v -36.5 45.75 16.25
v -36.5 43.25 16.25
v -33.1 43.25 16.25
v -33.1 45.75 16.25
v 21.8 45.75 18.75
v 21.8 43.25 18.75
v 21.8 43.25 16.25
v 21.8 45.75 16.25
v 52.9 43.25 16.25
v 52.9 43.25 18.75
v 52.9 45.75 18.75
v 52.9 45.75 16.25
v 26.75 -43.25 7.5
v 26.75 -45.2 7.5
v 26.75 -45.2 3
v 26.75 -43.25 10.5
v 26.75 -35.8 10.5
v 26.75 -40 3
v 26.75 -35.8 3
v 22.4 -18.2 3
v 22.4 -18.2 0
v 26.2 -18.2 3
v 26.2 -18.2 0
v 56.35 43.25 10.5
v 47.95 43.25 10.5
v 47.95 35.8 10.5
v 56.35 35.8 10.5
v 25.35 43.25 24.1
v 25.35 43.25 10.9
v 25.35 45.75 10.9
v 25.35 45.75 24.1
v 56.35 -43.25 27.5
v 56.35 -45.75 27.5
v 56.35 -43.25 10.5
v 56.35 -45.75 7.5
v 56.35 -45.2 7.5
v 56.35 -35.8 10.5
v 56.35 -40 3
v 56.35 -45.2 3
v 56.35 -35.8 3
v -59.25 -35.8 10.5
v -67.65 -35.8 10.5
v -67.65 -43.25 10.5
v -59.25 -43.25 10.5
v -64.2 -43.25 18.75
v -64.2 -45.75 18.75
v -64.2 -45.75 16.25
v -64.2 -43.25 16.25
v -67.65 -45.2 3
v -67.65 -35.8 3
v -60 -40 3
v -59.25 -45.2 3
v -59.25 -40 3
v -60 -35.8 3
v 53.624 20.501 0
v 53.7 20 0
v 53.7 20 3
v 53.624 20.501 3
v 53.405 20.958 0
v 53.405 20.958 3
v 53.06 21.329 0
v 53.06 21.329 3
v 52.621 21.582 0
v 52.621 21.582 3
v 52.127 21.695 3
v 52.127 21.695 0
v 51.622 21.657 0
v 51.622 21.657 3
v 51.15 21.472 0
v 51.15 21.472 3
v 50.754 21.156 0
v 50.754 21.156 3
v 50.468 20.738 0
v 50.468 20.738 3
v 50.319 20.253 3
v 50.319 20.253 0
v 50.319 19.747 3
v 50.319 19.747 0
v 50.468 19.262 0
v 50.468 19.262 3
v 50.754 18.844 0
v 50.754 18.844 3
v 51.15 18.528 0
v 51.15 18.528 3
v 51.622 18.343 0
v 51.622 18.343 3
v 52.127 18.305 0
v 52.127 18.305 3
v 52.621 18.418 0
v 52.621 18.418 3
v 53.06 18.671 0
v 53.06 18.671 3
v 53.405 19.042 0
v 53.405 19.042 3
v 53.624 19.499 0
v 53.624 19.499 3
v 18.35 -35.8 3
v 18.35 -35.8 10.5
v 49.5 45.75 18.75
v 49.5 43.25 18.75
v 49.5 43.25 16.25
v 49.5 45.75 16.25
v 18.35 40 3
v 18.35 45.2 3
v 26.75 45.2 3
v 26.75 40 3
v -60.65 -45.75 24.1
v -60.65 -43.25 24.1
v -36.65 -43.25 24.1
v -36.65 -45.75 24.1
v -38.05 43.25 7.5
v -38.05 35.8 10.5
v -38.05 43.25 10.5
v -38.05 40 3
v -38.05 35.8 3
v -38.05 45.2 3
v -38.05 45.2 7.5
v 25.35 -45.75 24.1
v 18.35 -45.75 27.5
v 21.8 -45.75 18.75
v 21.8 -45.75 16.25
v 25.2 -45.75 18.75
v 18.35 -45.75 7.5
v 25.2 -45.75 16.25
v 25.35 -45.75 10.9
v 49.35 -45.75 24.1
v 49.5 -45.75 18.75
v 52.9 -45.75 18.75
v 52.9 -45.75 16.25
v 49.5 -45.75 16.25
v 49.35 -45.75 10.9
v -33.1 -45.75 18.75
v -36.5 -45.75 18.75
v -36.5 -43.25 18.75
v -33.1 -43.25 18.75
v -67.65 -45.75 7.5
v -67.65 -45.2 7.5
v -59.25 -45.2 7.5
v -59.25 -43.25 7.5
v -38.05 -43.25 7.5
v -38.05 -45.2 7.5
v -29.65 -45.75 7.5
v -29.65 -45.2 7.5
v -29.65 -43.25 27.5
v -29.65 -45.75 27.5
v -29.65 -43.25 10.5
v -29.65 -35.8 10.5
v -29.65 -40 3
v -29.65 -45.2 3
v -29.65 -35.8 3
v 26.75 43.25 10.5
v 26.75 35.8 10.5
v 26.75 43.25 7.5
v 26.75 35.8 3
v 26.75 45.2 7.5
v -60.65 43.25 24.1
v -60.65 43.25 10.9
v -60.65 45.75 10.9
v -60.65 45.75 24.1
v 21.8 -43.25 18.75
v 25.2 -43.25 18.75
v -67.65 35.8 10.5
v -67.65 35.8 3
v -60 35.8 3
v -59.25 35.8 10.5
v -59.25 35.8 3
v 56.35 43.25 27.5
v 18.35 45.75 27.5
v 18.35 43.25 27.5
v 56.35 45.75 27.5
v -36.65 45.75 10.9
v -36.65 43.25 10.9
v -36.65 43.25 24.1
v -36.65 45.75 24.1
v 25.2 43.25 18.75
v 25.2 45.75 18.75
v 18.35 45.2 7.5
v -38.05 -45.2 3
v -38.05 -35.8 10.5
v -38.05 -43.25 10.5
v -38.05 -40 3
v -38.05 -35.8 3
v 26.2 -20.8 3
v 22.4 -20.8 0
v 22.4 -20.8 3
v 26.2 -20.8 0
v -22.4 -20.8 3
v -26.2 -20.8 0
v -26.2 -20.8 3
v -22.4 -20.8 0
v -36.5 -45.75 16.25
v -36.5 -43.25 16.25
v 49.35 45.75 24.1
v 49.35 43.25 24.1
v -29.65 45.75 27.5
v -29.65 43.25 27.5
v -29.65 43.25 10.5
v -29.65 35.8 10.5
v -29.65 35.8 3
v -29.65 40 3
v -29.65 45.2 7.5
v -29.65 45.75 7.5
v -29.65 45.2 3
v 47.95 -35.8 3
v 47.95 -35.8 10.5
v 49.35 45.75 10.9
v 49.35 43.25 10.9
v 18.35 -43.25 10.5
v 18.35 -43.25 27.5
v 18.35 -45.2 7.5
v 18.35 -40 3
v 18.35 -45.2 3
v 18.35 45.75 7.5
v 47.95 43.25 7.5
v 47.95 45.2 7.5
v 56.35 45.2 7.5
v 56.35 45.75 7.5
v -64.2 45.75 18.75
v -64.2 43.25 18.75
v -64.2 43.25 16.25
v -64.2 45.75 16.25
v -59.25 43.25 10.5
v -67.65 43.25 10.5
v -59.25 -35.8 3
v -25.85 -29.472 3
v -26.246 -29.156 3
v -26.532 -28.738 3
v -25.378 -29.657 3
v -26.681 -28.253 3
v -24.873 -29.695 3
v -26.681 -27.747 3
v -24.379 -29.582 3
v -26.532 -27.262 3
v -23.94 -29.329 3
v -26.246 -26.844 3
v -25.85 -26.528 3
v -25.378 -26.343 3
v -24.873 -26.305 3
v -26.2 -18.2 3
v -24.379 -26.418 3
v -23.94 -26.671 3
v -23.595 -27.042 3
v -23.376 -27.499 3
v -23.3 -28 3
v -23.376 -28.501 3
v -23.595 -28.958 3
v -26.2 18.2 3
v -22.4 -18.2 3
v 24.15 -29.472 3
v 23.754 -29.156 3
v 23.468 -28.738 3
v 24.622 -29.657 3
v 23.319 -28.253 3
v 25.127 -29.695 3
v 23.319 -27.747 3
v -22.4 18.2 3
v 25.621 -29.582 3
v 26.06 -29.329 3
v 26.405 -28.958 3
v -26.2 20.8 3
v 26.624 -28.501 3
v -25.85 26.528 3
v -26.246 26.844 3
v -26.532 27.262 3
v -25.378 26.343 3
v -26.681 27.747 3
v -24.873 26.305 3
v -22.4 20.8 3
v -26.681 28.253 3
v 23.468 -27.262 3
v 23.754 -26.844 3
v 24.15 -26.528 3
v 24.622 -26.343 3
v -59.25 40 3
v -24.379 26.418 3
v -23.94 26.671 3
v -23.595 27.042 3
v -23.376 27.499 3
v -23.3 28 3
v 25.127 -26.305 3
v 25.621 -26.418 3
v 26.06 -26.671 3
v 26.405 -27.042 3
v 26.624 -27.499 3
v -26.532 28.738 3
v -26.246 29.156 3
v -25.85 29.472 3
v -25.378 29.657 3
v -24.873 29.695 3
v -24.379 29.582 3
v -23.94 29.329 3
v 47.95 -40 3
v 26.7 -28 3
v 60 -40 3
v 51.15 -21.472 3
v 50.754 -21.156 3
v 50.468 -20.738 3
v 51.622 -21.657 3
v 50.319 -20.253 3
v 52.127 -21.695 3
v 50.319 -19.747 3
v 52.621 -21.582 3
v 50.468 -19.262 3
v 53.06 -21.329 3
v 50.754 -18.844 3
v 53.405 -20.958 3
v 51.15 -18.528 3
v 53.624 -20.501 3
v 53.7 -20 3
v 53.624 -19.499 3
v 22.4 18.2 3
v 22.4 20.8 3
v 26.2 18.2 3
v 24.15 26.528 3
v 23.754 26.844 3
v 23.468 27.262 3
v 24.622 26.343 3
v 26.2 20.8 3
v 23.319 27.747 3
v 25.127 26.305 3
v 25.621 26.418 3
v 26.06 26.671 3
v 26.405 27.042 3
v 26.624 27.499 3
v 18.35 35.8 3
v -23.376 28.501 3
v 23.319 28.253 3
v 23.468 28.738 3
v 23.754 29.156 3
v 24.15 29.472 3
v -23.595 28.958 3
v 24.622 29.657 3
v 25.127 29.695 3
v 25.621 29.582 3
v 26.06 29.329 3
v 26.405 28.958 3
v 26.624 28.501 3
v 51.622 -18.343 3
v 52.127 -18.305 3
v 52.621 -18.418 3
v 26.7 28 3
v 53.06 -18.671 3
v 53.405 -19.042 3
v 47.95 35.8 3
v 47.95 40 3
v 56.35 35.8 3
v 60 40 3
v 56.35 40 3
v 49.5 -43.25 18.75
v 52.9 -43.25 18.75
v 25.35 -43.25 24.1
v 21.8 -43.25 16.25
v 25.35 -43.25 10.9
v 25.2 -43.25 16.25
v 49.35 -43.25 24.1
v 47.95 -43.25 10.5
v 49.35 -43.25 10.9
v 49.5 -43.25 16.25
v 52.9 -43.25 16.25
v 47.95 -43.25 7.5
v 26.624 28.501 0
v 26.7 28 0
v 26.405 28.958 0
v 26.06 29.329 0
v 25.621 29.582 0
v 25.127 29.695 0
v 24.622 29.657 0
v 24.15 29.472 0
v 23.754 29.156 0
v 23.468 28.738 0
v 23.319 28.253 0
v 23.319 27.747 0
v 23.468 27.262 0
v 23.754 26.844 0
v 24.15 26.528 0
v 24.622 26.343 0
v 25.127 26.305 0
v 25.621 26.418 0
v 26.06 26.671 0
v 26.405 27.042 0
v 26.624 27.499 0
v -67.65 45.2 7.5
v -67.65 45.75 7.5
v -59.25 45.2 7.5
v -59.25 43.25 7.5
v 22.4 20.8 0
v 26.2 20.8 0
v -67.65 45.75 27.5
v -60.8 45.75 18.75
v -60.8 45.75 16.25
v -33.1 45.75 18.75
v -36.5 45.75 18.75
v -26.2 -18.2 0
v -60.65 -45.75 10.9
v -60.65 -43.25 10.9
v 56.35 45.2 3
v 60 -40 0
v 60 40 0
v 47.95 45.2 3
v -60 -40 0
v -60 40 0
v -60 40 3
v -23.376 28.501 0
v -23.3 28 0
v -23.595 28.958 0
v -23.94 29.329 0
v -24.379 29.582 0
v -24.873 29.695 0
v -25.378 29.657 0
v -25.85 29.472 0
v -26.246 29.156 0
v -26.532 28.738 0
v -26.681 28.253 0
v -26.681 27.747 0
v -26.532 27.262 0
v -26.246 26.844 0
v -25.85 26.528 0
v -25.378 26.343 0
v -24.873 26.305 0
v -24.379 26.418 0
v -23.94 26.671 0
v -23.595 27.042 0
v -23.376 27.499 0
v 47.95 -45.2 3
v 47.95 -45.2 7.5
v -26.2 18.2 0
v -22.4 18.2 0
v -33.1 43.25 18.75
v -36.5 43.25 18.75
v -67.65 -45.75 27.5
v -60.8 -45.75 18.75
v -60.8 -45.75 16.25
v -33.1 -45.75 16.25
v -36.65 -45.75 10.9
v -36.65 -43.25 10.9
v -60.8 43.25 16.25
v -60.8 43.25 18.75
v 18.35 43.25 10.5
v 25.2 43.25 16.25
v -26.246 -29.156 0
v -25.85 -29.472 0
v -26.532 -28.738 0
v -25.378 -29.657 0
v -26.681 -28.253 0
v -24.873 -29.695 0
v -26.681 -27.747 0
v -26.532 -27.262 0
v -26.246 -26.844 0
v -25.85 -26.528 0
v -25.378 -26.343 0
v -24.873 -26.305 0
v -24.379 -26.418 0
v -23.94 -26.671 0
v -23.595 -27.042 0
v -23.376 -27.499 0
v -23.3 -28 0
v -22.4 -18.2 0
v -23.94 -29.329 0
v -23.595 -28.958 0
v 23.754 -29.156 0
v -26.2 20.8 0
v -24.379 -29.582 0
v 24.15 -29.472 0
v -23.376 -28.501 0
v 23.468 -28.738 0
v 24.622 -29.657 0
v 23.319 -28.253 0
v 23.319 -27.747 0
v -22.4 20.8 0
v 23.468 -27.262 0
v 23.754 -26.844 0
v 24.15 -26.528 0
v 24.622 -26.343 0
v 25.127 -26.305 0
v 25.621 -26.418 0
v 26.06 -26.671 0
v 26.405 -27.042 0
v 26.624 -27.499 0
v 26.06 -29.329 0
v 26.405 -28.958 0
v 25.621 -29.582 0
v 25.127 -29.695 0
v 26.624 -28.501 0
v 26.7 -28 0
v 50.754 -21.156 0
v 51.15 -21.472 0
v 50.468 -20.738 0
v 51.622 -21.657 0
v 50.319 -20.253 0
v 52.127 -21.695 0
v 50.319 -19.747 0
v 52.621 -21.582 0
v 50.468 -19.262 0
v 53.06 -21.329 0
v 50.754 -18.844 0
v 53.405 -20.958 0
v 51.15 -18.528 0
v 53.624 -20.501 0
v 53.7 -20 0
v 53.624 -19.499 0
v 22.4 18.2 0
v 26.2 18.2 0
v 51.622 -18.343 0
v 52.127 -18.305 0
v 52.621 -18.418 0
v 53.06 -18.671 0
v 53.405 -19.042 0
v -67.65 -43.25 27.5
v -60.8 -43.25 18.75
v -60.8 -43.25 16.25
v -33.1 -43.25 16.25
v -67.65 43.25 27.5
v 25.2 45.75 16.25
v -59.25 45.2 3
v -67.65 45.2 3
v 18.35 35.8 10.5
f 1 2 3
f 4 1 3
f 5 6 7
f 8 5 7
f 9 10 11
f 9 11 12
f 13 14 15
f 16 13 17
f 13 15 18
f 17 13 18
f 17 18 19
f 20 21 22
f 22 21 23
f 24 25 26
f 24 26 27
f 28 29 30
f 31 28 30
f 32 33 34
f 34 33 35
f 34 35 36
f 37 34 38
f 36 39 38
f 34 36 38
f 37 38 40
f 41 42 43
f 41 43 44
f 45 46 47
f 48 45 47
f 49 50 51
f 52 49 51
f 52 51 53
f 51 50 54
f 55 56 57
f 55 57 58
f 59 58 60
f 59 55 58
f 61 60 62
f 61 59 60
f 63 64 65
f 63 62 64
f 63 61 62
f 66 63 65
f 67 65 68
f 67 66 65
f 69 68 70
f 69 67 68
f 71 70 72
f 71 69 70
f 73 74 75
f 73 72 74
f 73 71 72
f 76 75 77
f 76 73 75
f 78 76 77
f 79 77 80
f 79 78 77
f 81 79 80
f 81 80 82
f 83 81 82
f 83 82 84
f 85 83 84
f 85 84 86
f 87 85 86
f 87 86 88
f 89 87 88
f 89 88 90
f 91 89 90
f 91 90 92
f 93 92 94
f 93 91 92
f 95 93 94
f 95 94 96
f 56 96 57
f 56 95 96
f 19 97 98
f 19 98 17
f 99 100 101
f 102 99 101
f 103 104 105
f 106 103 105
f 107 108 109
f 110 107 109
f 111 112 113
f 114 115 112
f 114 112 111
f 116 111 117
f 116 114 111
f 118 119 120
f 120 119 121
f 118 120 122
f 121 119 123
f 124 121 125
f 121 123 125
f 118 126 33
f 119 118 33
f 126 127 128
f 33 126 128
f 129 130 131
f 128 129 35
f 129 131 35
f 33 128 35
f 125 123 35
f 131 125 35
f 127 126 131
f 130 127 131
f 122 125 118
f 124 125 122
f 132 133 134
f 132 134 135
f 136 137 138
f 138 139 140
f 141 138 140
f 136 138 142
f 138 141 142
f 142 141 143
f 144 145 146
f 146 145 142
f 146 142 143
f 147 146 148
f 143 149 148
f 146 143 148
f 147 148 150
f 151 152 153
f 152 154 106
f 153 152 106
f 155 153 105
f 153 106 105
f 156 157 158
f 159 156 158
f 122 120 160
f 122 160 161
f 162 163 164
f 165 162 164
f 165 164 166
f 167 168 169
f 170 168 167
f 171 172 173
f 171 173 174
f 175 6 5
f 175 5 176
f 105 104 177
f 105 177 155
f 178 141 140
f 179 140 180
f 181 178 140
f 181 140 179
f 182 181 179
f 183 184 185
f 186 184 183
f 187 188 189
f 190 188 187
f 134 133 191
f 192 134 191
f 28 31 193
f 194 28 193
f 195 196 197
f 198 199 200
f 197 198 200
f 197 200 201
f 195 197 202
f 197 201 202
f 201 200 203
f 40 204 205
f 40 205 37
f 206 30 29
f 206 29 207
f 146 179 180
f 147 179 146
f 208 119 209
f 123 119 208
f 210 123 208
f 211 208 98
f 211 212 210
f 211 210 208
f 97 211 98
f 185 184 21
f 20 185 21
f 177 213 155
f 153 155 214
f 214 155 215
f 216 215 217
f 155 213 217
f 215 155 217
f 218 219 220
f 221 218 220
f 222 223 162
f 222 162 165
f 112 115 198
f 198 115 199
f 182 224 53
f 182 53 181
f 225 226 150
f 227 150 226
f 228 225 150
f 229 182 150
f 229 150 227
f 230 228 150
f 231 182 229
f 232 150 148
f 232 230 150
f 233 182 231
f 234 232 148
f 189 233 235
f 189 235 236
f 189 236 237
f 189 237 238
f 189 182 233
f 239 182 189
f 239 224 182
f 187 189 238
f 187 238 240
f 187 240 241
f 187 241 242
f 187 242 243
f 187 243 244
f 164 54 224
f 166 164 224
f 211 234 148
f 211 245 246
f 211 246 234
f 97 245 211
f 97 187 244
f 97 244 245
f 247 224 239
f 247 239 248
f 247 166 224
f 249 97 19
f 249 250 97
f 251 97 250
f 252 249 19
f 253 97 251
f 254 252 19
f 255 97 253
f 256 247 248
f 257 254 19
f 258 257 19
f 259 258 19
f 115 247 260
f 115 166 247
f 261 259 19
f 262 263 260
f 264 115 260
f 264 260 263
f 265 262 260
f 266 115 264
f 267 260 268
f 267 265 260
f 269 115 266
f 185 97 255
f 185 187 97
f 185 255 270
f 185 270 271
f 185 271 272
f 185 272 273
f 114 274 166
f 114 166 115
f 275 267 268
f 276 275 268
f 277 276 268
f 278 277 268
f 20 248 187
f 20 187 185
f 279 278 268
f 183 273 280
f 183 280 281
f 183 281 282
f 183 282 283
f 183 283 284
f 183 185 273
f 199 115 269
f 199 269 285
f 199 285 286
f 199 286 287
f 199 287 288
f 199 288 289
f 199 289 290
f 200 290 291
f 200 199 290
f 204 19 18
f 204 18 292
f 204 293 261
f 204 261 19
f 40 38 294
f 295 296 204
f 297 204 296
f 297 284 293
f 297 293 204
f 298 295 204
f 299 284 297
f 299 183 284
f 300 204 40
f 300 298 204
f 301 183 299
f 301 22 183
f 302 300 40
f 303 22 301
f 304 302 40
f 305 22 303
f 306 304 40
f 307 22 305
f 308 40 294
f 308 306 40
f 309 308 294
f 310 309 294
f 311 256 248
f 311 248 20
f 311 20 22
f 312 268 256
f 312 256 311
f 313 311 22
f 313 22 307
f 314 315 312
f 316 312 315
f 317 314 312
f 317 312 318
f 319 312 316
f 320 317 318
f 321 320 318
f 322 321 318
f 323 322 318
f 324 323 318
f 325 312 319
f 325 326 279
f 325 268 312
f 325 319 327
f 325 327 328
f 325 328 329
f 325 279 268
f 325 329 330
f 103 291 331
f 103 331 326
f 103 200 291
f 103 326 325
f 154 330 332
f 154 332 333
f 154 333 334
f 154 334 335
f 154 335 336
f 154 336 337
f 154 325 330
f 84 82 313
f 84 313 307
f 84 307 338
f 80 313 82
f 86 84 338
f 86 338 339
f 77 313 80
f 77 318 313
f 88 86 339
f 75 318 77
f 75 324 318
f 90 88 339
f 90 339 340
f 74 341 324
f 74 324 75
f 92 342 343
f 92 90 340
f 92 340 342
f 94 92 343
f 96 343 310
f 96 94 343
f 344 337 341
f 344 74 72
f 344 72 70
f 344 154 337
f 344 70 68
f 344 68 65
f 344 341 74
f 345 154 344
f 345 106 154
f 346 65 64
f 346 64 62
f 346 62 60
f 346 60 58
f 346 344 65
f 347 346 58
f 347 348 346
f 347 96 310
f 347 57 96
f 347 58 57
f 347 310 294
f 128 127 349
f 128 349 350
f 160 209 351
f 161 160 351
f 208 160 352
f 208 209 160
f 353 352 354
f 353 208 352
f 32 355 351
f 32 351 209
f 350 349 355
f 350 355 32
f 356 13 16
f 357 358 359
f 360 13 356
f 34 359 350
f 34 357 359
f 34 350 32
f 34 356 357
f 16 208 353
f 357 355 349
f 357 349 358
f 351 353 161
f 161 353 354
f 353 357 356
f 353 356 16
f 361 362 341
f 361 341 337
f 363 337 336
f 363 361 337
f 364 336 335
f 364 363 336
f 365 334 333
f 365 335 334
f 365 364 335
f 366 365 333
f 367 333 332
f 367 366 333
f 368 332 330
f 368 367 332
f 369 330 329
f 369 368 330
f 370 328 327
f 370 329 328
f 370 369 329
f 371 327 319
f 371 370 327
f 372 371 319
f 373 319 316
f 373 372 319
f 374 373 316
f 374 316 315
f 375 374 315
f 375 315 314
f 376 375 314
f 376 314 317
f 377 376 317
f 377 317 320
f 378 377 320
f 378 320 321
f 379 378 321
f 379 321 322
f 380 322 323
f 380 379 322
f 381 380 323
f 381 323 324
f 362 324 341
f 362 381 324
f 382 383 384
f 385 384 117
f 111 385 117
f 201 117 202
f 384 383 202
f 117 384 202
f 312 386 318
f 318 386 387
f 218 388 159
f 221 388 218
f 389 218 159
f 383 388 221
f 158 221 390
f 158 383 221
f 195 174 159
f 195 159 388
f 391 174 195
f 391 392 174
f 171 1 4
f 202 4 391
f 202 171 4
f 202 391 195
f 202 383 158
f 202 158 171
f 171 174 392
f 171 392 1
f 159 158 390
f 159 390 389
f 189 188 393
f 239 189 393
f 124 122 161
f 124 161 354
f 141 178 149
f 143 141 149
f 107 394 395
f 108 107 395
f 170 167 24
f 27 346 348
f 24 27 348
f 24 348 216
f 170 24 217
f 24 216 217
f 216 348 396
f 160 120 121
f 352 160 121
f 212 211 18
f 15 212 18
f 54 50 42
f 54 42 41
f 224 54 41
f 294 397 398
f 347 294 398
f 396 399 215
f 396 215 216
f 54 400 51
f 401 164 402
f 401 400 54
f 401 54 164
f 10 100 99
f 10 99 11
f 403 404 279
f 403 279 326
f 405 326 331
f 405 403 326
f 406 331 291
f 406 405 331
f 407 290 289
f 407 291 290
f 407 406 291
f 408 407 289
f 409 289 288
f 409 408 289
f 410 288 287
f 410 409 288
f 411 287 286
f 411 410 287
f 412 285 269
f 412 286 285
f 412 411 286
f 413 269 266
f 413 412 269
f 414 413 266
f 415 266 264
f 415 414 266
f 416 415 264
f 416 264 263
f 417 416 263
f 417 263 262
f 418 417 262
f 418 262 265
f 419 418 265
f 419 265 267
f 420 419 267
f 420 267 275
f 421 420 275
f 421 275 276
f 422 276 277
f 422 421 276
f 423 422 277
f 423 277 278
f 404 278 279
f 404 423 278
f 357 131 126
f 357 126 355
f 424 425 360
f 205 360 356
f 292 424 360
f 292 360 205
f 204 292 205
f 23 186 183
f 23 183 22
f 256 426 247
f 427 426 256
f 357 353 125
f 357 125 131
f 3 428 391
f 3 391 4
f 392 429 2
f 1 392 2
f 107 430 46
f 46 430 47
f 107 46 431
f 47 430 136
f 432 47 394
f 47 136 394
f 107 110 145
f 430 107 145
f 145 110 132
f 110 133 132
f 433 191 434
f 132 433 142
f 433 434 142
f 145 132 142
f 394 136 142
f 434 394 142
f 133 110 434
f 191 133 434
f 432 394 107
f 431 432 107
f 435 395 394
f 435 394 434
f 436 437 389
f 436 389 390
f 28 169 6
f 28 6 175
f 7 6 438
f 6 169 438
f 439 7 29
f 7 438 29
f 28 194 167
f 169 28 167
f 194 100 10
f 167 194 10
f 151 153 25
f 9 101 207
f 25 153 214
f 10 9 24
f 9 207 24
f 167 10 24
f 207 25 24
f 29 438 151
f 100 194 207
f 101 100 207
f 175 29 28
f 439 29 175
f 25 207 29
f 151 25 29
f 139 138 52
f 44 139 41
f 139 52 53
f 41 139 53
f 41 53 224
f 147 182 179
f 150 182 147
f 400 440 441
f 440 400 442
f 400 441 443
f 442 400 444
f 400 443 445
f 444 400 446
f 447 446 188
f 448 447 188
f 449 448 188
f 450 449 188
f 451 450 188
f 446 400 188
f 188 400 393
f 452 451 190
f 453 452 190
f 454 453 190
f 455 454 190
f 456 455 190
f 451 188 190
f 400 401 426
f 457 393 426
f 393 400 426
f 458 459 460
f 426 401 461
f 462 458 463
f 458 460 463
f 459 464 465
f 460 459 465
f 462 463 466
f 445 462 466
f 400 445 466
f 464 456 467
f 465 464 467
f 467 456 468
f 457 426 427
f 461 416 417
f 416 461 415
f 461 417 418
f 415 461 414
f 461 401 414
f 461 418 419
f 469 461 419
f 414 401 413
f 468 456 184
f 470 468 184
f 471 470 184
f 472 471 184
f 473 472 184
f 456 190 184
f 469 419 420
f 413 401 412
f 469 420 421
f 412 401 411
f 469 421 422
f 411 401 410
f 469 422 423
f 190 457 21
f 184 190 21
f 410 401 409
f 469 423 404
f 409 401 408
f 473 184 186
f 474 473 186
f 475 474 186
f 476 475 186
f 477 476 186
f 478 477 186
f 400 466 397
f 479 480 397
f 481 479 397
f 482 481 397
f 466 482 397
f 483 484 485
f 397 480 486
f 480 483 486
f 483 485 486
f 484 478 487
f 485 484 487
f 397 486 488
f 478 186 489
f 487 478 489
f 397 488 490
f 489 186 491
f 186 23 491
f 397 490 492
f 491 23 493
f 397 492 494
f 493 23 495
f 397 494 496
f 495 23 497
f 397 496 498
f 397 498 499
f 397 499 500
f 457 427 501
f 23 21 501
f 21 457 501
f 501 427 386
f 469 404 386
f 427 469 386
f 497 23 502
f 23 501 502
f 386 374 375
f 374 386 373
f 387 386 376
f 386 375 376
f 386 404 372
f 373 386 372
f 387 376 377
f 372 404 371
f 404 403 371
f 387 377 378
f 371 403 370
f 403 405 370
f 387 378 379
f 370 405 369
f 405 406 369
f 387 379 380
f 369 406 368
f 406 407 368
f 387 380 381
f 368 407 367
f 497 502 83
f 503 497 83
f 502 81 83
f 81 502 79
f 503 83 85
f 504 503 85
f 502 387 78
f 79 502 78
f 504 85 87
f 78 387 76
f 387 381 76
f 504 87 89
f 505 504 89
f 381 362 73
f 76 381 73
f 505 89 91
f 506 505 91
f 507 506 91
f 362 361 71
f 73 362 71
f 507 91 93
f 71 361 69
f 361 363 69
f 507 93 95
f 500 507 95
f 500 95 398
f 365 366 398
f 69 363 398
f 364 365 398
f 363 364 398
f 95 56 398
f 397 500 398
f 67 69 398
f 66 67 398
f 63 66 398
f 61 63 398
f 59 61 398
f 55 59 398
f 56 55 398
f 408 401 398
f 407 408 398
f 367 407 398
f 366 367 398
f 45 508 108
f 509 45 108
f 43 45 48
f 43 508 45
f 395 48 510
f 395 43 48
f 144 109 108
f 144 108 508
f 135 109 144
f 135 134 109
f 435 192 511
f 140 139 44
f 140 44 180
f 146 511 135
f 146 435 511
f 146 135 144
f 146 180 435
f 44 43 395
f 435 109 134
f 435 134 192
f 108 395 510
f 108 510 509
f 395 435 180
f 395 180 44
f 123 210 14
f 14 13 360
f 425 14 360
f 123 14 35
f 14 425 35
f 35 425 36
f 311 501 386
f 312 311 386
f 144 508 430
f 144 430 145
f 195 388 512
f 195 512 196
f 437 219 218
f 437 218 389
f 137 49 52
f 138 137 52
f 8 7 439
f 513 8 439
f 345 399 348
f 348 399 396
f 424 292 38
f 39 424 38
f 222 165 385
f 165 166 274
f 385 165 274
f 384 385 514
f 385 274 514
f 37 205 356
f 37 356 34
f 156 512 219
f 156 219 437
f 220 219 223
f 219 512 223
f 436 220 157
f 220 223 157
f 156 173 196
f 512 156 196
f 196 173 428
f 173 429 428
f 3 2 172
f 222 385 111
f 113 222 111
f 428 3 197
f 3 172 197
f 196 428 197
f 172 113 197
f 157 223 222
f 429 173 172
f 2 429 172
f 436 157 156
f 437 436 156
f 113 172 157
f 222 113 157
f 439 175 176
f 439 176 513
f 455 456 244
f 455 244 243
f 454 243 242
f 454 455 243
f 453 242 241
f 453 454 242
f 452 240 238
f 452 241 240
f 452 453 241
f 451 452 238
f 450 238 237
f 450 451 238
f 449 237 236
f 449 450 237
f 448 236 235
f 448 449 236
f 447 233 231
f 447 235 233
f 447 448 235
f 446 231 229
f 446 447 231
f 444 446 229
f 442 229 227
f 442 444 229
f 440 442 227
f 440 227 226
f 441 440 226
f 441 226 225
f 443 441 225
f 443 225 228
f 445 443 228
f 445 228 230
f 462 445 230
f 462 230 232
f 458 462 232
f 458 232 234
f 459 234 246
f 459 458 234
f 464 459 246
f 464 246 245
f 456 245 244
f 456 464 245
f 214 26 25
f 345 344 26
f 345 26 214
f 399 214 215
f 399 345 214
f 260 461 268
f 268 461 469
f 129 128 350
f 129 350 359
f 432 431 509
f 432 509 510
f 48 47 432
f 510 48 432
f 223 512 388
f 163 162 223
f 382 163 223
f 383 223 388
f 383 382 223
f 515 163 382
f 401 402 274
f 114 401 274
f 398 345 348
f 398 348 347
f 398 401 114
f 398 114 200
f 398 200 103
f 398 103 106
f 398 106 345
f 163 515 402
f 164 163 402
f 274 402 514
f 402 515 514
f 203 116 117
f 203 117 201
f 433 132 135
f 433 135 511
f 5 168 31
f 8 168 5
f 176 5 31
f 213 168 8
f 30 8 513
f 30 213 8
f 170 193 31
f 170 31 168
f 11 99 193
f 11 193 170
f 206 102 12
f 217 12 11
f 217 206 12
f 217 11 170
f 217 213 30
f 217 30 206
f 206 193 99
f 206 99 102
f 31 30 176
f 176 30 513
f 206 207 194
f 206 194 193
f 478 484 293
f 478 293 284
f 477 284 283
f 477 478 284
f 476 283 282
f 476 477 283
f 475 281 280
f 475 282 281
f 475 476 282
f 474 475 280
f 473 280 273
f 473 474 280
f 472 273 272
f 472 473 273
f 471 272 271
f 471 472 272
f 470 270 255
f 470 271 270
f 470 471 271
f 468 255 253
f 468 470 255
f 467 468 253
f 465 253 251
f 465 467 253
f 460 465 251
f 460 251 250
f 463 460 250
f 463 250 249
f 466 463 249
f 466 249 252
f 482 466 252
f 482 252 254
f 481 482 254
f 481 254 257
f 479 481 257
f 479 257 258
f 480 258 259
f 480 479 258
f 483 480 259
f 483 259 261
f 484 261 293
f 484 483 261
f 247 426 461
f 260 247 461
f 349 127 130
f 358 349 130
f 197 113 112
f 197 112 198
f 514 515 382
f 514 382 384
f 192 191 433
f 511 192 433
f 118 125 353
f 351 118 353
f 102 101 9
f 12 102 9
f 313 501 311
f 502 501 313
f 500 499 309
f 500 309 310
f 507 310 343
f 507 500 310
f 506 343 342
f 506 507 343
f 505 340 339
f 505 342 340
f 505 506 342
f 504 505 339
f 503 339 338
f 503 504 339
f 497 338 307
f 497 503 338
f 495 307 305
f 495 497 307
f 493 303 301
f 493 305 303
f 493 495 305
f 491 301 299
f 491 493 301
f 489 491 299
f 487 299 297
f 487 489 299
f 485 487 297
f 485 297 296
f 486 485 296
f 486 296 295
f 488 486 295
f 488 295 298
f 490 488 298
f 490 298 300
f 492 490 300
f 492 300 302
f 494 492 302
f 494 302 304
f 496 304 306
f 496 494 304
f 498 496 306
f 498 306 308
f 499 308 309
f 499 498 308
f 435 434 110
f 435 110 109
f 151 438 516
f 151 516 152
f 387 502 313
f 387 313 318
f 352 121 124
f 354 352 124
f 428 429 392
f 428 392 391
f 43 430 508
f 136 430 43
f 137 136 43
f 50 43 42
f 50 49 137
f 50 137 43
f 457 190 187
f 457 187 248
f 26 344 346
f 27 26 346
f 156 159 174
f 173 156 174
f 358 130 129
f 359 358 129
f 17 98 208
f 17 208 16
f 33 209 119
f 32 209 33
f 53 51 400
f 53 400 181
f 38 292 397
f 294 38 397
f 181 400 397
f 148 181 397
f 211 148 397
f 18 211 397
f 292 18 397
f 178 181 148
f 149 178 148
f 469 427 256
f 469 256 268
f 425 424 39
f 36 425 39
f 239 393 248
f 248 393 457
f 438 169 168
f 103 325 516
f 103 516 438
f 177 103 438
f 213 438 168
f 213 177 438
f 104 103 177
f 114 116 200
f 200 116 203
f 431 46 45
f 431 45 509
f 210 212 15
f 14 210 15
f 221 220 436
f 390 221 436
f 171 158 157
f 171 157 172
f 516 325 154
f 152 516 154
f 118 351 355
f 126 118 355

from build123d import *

# Parameters (mm, degrees)
SKETCH_1_W                       = 120
SKETCH_1_H                       = 80
DECK_120X80X3_DEPTH              = 3
FRAME_RIB_START                  = 3
SKETCH_2_W                       = 8.4
SKETCH_2_H                       = 9.4
FRAME_RIB_DEPTH                  = 7.5
EXTRUDE_START                    = 3
SKETCH_3_W                       = 8.4
SKETCH_3_H                       = 9.4
EXTRUDE_3_DEPTH                  = 7.5
MOUNT_UPRIGHT_START              = 10.5
SKETCH_4_W                       = 7
SKETCH_4_H                       = 2.5
MOUNT_UPRIGHT_DEPTH              = 17
EXTRUDE_START_2                  = 10.5
SKETCH_5_W                       = 7
SKETCH_5_H                       = 2.5
EXTRUDE_5_DEPTH                  = 17
MOUNT_LOWER_BEAM_START           = 7.5
SKETCH_6_W                       = 38
SKETCH_6_H                       = 2.5
MOUNT_LOWER_BEAM_DEPTH           = 3.4
MOUNT_UPPER_BEAM_START           = 24.1
SKETCH_7_W                       = 38
SKETCH_7_H                       = 2.5
MOUNT_UPPER_BEAM_DEPTH           = 3.4
SERVO_EAR_ADJUSTABLE_SLOTS_START = -46.5
SKETCH_8_W                       = 3.4
SKETCH_8_H                       = 2.5
SERVO_EAR_ADJUSTABLE_SLOTS_DEPTH = 4
SKETCH_9_W                       = 8.4
SKETCH_9_H                       = 9.4
EXTRUDE_8_DEPTH                  = 7.5
SKETCH_10_W                      = 8.4
SKETCH_10_H                      = 9.4
EXTRUDE_9_DEPTH                  = 7.5
SKETCH_11_W                      = 7
SKETCH_11_H                      = 2.5
EXTRUDE_10_DEPTH                 = 17
SKETCH_12_W                      = 7
SKETCH_12_H                      = 2.5
EXTRUDE_11_DEPTH                 = 17
EXTRUDE_START_3                  = 7.5
SKETCH_13_W                      = 38
SKETCH_13_H                      = 2.5
EXTRUDE_12_DEPTH                 = 3.4
EXTRUDE_START_4                  = 24.1
SKETCH_14_W                      = 38
SKETCH_14_H                      = 2.5
EXTRUDE_13_DEPTH                 = 3.4
CUT_EXTRUDE_START                = 42.5
SKETCH_15_W                      = 3.4
SKETCH_15_H                      = 2.5
CUT_EXTRUDE_2_DEPTH              = 4
SKETCH_16_W                      = 8.4
SKETCH_16_H                      = 9.4
EXTRUDE_14_DEPTH                 = 7.5
SKETCH_17_W                      = 8.4
SKETCH_17_H                      = 9.4
EXTRUDE_15_DEPTH                 = 7.5
SKETCH_18_W                      = 7
SKETCH_18_H                      = 2.5
EXTRUDE_16_DEPTH                 = 17
SKETCH_19_W                      = 7
SKETCH_19_H                      = 2.5
EXTRUDE_17_DEPTH                 = 17
SKETCH_20_W                      = 38
SKETCH_20_H                      = 2.5
EXTRUDE_18_DEPTH                 = 3.4
SKETCH_21_W                      = 38
SKETCH_21_H                      = 2.5
EXTRUDE_19_DEPTH                 = 3.4
CUT_EXTRUDE_START_2              = -46.5
SKETCH_22_W                      = 3.4
SKETCH_22_H                      = 2.5
CUT_EXTRUDE_3_DEPTH              = 4
SKETCH_23_W                      = 8.4
SKETCH_23_H                      = 9.4
EXTRUDE_20_DEPTH                 = 7.5
SKETCH_24_W                      = 8.4
SKETCH_24_H                      = 9.4
EXTRUDE_21_DEPTH                 = 7.5
SKETCH_25_W                      = 7
SKETCH_25_H                      = 2.5
EXTRUDE_22_DEPTH                 = 17
SKETCH_26_W                      = 7
SKETCH_26_H                      = 2.5
EXTRUDE_23_DEPTH                 = 17
SKETCH_27_W                      = 38
SKETCH_27_H                      = 2.5
EXTRUDE_24_DEPTH                 = 3.4
SKETCH_28_W                      = 38
SKETCH_28_H                      = 2.5
EXTRUDE_25_DEPTH                 = 3.4
SKETCH_29_W                      = 3.4
SKETCH_29_H                      = 2.5
CUT_EXTRUDE_4_DEPTH              = 4
M3_DECK_MOUNTING_HOLES_START     = -0.1
SKETCH_30_R                      = 1.7
M3_DECK_MOUNTING_HOLES_DEPTH     = 3.2
PCB_SCREW_ACCESS_START           = -0.1
SKETCH_31_W                      = 3.8
SKETCH_31_H                      = 2.6
PCB_SCREW_ACCESS_DEPTH           = 3.2


with BuildPart() as part:
    # 草图1 → Deck_120x80x3 (new body)
    with BuildSketch(Plane.XY):
        Rectangle(SKETCH_1_W, SKETCH_1_H)
    extrude(amount=DECK_120X80X3_DEPTH)

    # 草图2 → Frame_rib (add)
    with BuildSketch(Plane.XY.offset(FRAME_RIB_START)):
        with Locations((-63.45, -40.5)):
            Rectangle(SKETCH_2_W, SKETCH_2_H)
    extrude(amount=FRAME_RIB_DEPTH)

    # 草图3 → 凸台-拉伸3 (add)
    with BuildSketch(Plane.XY.offset(EXTRUDE_START)):
        with Locations((-33.85, -40.5)):
            Rectangle(SKETCH_3_W, SKETCH_3_H)
    extrude(amount=EXTRUDE_3_DEPTH)

    # 草图4 → Mount_upright (add)
    with BuildSketch(Plane.XY.offset(MOUNT_UPRIGHT_START)):
        with Locations((-64.15, -44.5)):
            Rectangle(SKETCH_4_W, SKETCH_4_H)
    extrude(amount=MOUNT_UPRIGHT_DEPTH)

    # 草图5 → 凸台-拉伸5 (add)
    with BuildSketch(Plane.XY.offset(EXTRUDE_START_2)):
        with Locations((-33.15, -44.5)):
            Rectangle(SKETCH_5_W, SKETCH_5_H)
    extrude(amount=EXTRUDE_5_DEPTH)

    # 草图6 → Mount_lower_beam (add)
    with BuildSketch(Plane.XY.offset(MOUNT_LOWER_BEAM_START)):
        with Locations((-48.65, -44.5)):
            Rectangle(SKETCH_6_W, SKETCH_6_H)
    extrude(amount=MOUNT_LOWER_BEAM_DEPTH)

    # 草图7 → Mount_upper_beam (add)
    with BuildSketch(Plane.XY.offset(MOUNT_UPPER_BEAM_START)):
        with Locations((-48.65, -44.5)):
            Rectangle(SKETCH_7_W, SKETCH_7_H)
    extrude(amount=MOUNT_UPPER_BEAM_DEPTH)

    # 草图8 → Servo_ear_adjustable_slots (cut)
    with BuildSketch(Plane(origin=(0, 0, 0), x_dir=(1, 0, 0), z_dir=(0, 1, 0)).offset(SERVO_EAR_ADJUSTABLE_SLOTS_START)):
        with Locations((-62.5, -17.5)):
            Rectangle(SKETCH_8_W, SKETCH_8_H)
        with Locations((-34.8, -17.5)):
            Rectangle(SKETCH_8_W, SKETCH_8_H)
    extrude(amount=SERVO_EAR_ADJUSTABLE_SLOTS_DEPTH, mode=Mode.SUBTRACT)

    # 草图9 → 凸台-拉伸8 (add)
    with BuildSketch(Plane.XY.offset(EXTRUDE_START)):
        with Locations((-63.45, 40.5)):
            Rectangle(SKETCH_9_W, SKETCH_9_H)
    extrude(amount=EXTRUDE_8_DEPTH)

    # 草图10 → 凸台-拉伸9 (add)
    with BuildSketch(Plane.XY.offset(EXTRUDE_START)):
        with Locations((-33.85, 40.5)):
            Rectangle(SKETCH_10_W, SKETCH_10_H)
    extrude(amount=EXTRUDE_9_DEPTH)

    # 草图11 → 凸台-拉伸10 (add)
    with BuildSketch(Plane.XY.offset(EXTRUDE_START_2)):
        with Locations((-64.15, 44.5)):
            Rectangle(SKETCH_11_W, SKETCH_11_H)
    extrude(amount=EXTRUDE_10_DEPTH)

    # 草图12 → 凸台-拉伸11 (add)
    with BuildSketch(Plane.XY.offset(EXTRUDE_START_2)):
        with Locations((-33.15, 44.5)):
            Rectangle(SKETCH_12_W, SKETCH_12_H)
    extrude(amount=EXTRUDE_11_DEPTH)

    # 草图13 → 凸台-拉伸12 (add)
    with BuildSketch(Plane.XY.offset(EXTRUDE_START_3)):
        with Locations((-48.65, 44.5)):
            Rectangle(SKETCH_13_W, SKETCH_13_H)
    extrude(amount=EXTRUDE_12_DEPTH)

    # 草图14 → 凸台-拉伸13 (add)
    with BuildSketch(Plane.XY.offset(EXTRUDE_START_4)):
        with Locations((-48.65, 44.5)):
            Rectangle(SKETCH_14_W, SKETCH_14_H)
    extrude(amount=EXTRUDE_13_DEPTH)

    # 草图15 → 切除-拉伸2 (cut)
    with BuildSketch(Plane(origin=(0, 0, 0), x_dir=(1, 0, 0), z_dir=(0, 1, 0)).offset(CUT_EXTRUDE_START)):
        with Locations((-62.5, -17.5)):
            Rectangle(SKETCH_15_W, SKETCH_15_H)
        with Locations((-34.8, -17.5)):
            Rectangle(SKETCH_15_W, SKETCH_15_H)
    extrude(amount=CUT_EXTRUDE_2_DEPTH, mode=Mode.SUBTRACT)

    # 草图16 → 凸台-拉伸14 (add)
    with BuildSketch(Plane.XY.offset(EXTRUDE_START)):
        with Locations((22.55, -40.5)):
            Rectangle(SKETCH_16_W, SKETCH_16_H)
    extrude(amount=EXTRUDE_14_DEPTH)

    # 草图17 → 凸台-拉伸15 (add)
    with BuildSketch(Plane.XY.offset(EXTRUDE_START)):
        with Locations((52.15, -40.5)):
            Rectangle(SKETCH_17_W, SKETCH_17_H)
    extrude(amount=EXTRUDE_15_DEPTH)

    # 草图18 → 凸台-拉伸16 (add)
    with BuildSketch(Plane.XY.offset(EXTRUDE_START_2)):
        with Locations((21.85, -44.5)):
            Rectangle(SKETCH_18_W, SKETCH_18_H)
    extrude(amount=EXTRUDE_16_DEPTH)

    # 草图19 → 凸台-拉伸17 (add)
    with BuildSketch(Plane.XY.offset(EXTRUDE_START_2)):
        with Locations((52.85, -44.5)):
            Rectangle(SKETCH_19_W, SKETCH_19_H)
    extrude(amount=EXTRUDE_17_DEPTH)

    # 草图20 → 凸台-拉伸18 (add)
    with BuildSketch(Plane.XY.offset(EXTRUDE_START_3)):
        with Locations((37.35, -44.5)):
            Rectangle(SKETCH_20_W, SKETCH_20_H)
    extrude(amount=EXTRUDE_18_DEPTH)

    # 草图21 → 凸台-拉伸19 (add)
    with BuildSketch(Plane.XY.offset(EXTRUDE_START_4)):
        with Locations((37.35, -44.5)):
            Rectangle(SKETCH_21_W, SKETCH_21_H)
    extrude(amount=EXTRUDE_19_DEPTH)

    # 草图22 → 切除-拉伸3 (cut)
    with BuildSketch(Plane(origin=(0, 0, 0), x_dir=(1, 0, 0), z_dir=(0, 1, 0)).offset(CUT_EXTRUDE_START_2)):
        with Locations((23.5, -17.5)):
            Rectangle(SKETCH_22_W, SKETCH_22_H)
        with Locations((51.2, -17.5)):
            Rectangle(SKETCH_22_W, SKETCH_22_H)
    extrude(amount=CUT_EXTRUDE_3_DEPTH, mode=Mode.SUBTRACT)

    # 草图23 → 凸台-拉伸20 (add)
    with BuildSketch(Plane.XY.offset(EXTRUDE_START)):
        with Locations((22.55, 40.5)):
            Rectangle(SKETCH_23_W, SKETCH_23_H)
    extrude(amount=EXTRUDE_20_DEPTH)

    # 草图24 → 凸台-拉伸21 (add)
    with BuildSketch(Plane.XY.offset(EXTRUDE_START)):
        with Locations((52.15, 40.5)):
            Rectangle(SKETCH_24_W, SKETCH_24_H)
    extrude(amount=EXTRUDE_21_DEPTH)

    # 草图25 → 凸台-拉伸22 (add)
    with BuildSketch(Plane.XY.offset(EXTRUDE_START_2)):
        with Locations((21.85, 44.5)):
            Rectangle(SKETCH_25_W, SKETCH_25_H)
    extrude(amount=EXTRUDE_22_DEPTH)

    # 草图26 → 凸台-拉伸23 (add)
    with BuildSketch(Plane.XY.offset(EXTRUDE_START_2)):
        with Locations((52.85, 44.5)):
            Rectangle(SKETCH_26_W, SKETCH_26_H)
    extrude(amount=EXTRUDE_23_DEPTH)

    # 草图27 → 凸台-拉伸24 (add)
    with BuildSketch(Plane.XY.offset(EXTRUDE_START_3)):
        with Locations((37.35, 44.5)):
            Rectangle(SKETCH_27_W, SKETCH_27_H)
    extrude(amount=EXTRUDE_24_DEPTH)

    # 草图28 → 凸台-拉伸25 (add)
    with BuildSketch(Plane.XY.offset(EXTRUDE_START_4)):
        with Locations((37.35, 44.5)):
            Rectangle(SKETCH_28_W, SKETCH_28_H)
    extrude(amount=EXTRUDE_25_DEPTH)

    # 草图29 → 切除-拉伸4 (cut)
    with BuildSketch(Plane(origin=(0, 0, 0), x_dir=(1, 0, 0), z_dir=(0, 1, 0)).offset(CUT_EXTRUDE_START)):
        with Locations((23.5, -17.5)):
            Rectangle(SKETCH_29_W, SKETCH_29_H)
        with Locations((51.2, -17.5)):
            Rectangle(SKETCH_29_W, SKETCH_29_H)
    extrude(amount=CUT_EXTRUDE_4_DEPTH, mode=Mode.SUBTRACT)

    # 草图30 → M3_deck_mounting_holes (cut)
    with BuildSketch(Plane.XY.offset(M3_DECK_MOUNTING_HOLES_START)):
        with Locations((-25, -28)):
            Circle(SKETCH_30_R)
        with Locations((-25, 28)):
            Circle(SKETCH_30_R)
        with Locations((25, -28)):
            Circle(SKETCH_30_R)
        with Locations((25, 28)):
            Circle(SKETCH_30_R)
        with Locations((52, -20)):
            Circle(SKETCH_30_R)
        with Locations((52, 20)):
            Circle(SKETCH_30_R)
    extrude(amount=M3_DECK_MOUNTING_HOLES_DEPTH, mode=Mode.SUBTRACT)

    # 草图31 → PCB_screw_access (cut)
    with BuildSketch(Plane.XY.offset(PCB_SCREW_ACCESS_START)):
        with Locations((-24.3, -19.5)):
            Rectangle(SKETCH_31_W, SKETCH_31_H)
        with Locations((-24.3, 19.5)):
            Rectangle(SKETCH_31_W, SKETCH_31_H)
        with Locations((24.3, -19.5)):
            Rectangle(SKETCH_31_W, SKETCH_31_H)
        with Locations((24.3, 19.5)):
            Rectangle(SKETCH_31_W, SKETCH_31_H)
    extrude(amount=PCB_SCREW_ACCESS_DEPTH, mode=Mode.SUBTRACT)


solid = part.part
